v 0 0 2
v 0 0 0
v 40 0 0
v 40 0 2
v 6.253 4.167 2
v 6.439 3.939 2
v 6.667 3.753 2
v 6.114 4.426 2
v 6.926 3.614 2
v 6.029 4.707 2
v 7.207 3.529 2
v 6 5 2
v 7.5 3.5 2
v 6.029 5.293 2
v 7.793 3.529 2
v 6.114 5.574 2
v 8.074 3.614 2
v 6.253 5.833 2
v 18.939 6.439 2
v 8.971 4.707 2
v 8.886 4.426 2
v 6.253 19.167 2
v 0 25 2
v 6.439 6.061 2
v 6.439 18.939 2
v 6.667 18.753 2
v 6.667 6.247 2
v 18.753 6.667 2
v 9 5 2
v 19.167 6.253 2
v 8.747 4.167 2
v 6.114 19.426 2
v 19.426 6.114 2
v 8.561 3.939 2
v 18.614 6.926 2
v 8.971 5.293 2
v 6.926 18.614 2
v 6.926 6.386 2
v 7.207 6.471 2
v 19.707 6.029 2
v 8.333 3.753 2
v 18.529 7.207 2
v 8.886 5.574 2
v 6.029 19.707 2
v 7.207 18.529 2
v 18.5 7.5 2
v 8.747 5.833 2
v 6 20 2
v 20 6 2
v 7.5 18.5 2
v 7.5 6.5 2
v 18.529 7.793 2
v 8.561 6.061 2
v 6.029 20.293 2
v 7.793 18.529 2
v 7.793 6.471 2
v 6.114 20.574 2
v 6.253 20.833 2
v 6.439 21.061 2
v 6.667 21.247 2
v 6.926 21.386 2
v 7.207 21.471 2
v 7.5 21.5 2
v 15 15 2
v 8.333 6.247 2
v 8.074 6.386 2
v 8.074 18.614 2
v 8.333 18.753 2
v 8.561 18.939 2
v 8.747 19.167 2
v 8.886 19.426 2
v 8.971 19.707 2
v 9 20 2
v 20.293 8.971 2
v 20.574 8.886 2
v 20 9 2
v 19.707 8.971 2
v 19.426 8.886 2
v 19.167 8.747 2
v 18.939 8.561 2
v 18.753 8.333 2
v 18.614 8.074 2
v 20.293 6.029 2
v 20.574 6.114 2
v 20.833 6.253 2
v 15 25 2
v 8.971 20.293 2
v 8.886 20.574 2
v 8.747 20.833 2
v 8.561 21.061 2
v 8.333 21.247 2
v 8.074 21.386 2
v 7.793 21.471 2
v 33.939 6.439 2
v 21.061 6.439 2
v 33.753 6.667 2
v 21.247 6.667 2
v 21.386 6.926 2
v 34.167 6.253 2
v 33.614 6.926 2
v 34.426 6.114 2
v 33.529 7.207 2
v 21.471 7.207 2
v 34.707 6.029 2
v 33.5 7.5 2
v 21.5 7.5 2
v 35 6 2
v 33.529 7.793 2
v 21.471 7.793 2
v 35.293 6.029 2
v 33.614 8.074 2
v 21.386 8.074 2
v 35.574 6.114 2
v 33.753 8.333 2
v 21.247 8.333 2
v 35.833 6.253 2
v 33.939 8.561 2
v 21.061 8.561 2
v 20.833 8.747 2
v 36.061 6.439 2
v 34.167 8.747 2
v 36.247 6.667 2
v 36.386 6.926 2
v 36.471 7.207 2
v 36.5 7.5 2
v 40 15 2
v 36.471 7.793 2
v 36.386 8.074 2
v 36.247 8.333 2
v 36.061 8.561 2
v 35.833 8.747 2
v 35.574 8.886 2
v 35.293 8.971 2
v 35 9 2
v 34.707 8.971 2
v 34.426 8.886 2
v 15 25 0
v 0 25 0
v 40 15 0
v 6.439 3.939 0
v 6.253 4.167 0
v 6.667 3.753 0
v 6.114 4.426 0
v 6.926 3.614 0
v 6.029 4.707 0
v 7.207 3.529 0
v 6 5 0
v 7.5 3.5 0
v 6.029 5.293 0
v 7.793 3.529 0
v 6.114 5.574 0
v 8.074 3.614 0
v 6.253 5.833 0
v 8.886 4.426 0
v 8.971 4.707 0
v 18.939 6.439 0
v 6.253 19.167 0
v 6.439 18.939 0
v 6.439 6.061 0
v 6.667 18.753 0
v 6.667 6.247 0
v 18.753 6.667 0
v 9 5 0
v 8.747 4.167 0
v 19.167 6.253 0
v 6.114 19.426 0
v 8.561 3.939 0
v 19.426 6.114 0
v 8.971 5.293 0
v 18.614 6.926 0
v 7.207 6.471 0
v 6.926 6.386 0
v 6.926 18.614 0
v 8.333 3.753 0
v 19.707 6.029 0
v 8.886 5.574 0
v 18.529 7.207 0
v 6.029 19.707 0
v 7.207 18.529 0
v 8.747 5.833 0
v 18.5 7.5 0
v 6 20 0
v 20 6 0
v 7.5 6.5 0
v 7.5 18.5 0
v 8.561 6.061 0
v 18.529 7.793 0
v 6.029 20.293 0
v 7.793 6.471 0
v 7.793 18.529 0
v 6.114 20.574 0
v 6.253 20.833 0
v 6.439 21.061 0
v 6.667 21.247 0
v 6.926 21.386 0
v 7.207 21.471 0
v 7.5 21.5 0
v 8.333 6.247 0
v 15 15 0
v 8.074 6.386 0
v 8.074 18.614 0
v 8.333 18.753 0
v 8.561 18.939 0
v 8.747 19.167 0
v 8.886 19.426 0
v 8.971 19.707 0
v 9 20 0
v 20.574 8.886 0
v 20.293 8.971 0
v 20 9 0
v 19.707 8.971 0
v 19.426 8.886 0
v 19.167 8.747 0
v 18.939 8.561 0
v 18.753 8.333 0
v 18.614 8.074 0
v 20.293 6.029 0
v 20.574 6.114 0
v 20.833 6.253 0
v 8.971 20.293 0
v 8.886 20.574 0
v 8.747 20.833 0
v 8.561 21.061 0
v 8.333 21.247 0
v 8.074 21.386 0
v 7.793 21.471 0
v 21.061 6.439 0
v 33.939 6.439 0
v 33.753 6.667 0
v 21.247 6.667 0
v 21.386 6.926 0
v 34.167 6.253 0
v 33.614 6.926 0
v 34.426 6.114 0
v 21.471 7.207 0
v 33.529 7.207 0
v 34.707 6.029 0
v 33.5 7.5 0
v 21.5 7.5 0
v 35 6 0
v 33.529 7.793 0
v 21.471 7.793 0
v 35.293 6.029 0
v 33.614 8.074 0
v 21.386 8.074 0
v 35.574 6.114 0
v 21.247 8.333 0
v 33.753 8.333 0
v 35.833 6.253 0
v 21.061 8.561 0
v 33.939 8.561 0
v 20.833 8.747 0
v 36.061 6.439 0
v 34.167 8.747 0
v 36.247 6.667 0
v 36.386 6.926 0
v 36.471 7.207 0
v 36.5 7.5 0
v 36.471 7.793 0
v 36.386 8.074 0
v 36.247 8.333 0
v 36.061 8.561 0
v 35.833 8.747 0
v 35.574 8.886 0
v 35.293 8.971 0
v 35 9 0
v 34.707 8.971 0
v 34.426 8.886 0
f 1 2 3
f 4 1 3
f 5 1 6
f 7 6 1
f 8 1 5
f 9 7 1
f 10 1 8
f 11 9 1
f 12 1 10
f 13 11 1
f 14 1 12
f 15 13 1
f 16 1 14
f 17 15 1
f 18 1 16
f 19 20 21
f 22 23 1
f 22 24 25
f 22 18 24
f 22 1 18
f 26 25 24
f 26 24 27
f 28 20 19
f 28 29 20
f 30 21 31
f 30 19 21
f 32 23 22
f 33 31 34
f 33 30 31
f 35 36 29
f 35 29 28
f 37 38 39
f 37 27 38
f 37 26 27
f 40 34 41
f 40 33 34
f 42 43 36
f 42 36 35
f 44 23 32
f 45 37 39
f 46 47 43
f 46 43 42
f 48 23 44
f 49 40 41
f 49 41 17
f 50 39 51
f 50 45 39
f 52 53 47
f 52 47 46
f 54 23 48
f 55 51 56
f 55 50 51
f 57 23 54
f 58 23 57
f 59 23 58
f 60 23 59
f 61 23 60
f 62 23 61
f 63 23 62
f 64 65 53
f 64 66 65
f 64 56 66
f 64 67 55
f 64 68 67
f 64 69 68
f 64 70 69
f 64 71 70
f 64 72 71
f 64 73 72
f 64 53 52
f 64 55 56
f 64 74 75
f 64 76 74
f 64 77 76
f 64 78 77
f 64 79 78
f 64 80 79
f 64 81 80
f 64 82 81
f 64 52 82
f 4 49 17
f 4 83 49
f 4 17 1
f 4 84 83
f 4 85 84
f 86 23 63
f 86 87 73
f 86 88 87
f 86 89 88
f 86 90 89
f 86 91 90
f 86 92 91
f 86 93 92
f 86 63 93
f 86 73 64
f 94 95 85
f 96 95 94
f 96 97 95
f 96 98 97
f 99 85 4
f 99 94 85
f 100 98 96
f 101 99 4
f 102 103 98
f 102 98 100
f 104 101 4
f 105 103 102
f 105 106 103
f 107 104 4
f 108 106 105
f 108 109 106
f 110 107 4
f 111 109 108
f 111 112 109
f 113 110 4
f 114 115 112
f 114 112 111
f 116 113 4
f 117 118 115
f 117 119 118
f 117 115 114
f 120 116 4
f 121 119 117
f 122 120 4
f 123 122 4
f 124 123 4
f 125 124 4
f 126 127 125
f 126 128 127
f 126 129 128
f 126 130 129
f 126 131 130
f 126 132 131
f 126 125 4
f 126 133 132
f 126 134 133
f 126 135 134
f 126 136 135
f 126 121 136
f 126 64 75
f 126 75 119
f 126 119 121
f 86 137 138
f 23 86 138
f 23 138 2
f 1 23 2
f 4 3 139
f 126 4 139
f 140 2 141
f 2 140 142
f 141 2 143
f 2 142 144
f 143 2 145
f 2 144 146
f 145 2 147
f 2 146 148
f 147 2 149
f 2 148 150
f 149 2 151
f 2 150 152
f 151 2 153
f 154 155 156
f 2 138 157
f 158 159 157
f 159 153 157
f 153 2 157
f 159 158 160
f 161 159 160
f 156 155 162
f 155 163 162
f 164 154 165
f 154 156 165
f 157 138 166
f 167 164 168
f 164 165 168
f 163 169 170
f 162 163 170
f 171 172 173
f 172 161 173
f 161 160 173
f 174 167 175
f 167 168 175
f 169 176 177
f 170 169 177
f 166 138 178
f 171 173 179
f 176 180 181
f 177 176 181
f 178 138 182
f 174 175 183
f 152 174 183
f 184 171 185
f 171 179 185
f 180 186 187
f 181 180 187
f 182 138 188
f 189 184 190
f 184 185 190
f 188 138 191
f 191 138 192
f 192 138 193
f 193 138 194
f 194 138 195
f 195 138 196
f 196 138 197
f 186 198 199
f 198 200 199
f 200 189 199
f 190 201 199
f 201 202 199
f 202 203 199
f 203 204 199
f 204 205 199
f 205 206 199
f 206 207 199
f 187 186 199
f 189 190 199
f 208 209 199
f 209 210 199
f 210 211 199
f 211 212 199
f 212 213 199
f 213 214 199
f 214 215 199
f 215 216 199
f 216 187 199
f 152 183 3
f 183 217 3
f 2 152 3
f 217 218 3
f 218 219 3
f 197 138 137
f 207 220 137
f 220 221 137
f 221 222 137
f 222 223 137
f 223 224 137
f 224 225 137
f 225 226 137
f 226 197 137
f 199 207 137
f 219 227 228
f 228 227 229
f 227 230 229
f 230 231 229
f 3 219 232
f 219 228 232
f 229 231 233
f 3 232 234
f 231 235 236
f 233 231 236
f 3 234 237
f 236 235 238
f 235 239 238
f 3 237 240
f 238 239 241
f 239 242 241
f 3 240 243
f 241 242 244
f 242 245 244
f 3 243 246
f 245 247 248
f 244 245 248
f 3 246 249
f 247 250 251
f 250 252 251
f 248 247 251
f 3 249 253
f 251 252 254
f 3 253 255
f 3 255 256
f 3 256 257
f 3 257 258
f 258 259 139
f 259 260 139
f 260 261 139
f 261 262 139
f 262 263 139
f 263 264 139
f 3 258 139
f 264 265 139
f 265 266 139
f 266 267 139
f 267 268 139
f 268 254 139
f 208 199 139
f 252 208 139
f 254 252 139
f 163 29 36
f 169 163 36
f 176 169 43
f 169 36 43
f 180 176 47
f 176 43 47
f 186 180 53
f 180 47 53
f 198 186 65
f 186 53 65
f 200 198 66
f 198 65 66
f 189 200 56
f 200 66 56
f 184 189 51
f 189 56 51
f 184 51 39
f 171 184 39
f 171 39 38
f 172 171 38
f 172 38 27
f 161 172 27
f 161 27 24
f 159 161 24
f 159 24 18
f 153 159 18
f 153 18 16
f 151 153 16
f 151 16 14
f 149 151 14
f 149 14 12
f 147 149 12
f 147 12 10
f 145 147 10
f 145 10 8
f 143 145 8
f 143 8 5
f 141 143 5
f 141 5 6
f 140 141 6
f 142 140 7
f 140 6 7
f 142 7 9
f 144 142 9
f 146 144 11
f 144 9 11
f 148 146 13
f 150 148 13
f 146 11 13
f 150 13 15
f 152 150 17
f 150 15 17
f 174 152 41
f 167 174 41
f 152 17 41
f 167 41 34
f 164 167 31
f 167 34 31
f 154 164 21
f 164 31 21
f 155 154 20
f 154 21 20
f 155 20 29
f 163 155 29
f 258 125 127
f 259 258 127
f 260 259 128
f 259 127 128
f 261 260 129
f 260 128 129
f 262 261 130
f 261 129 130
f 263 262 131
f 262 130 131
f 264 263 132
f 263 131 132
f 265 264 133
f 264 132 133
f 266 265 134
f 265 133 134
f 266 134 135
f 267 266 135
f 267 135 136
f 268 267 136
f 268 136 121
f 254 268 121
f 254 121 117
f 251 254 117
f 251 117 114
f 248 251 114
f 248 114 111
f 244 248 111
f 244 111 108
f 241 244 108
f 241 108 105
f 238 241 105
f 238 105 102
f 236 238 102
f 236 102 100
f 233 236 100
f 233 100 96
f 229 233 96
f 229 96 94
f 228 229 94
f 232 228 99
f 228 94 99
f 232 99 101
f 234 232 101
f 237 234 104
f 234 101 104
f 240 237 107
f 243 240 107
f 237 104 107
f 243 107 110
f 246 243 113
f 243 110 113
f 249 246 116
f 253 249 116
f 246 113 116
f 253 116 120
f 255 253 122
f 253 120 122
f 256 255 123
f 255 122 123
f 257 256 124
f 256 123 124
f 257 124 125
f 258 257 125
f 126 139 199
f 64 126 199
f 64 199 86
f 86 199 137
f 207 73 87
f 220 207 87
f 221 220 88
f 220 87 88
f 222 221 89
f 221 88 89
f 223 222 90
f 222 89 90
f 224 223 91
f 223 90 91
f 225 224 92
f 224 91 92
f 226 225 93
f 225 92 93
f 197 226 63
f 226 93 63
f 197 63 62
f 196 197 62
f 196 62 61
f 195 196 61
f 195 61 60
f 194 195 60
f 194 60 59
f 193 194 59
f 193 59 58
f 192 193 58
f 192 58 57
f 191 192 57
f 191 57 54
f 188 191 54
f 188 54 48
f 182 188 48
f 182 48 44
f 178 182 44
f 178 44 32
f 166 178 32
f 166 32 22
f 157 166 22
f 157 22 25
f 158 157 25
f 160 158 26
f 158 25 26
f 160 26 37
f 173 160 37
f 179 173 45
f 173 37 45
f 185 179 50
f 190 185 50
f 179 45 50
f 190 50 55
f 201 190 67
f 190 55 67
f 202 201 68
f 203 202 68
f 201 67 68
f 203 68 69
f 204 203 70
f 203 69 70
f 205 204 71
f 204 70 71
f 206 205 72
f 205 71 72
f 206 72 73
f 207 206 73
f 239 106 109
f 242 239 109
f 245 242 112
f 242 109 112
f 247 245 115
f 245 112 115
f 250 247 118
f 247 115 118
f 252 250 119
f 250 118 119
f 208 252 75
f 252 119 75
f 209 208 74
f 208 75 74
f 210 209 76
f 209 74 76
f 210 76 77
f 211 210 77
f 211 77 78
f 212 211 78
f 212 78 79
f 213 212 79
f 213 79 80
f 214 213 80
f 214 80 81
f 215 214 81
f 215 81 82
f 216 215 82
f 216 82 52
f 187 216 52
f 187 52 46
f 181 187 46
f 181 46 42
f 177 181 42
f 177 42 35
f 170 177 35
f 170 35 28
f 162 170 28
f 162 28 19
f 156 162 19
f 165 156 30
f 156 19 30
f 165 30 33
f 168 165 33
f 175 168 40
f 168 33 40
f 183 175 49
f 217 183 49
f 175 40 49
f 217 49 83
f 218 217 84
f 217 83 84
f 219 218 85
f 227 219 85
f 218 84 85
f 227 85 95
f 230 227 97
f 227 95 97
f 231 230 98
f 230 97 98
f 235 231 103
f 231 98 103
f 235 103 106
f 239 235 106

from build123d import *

# Parameters (mm, degrees)
EXTRUSION1_DEPTH = 2
ESQUISSE2_R      = 1.5
EXTRUSION2_DEPTH = 48.212286536


with BuildPart() as part:
    # Esquisse1 → Extrusion1 (new body)
    with BuildSketch(Plane.XY):
        Polygon((0, 0), (15, 0), (40, 0), (40, 15), (15, 15), (15, 25), (0, 25), align=None)
    extrude(amount=EXTRUSION1_DEPTH)

    # Esquisse2 → Extrusion2 (cut, through all)
    with BuildSketch(Plane.XY.offset(2)):
        with Locations((7.5, 20)):
            Circle(ESQUISSE2_R)
        with Locations((7.5, 5)):
            Circle(ESQUISSE2_R)
        with Locations((20, 7.5)):
            Circle(ESQUISSE2_R)
        with Locations((35, 7.5)):
            Circle(ESQUISSE2_R)
    extrude(amount=-EXTRUSION2_DEPTH, mode=Mode.SUBTRACT)


solid = part.part
